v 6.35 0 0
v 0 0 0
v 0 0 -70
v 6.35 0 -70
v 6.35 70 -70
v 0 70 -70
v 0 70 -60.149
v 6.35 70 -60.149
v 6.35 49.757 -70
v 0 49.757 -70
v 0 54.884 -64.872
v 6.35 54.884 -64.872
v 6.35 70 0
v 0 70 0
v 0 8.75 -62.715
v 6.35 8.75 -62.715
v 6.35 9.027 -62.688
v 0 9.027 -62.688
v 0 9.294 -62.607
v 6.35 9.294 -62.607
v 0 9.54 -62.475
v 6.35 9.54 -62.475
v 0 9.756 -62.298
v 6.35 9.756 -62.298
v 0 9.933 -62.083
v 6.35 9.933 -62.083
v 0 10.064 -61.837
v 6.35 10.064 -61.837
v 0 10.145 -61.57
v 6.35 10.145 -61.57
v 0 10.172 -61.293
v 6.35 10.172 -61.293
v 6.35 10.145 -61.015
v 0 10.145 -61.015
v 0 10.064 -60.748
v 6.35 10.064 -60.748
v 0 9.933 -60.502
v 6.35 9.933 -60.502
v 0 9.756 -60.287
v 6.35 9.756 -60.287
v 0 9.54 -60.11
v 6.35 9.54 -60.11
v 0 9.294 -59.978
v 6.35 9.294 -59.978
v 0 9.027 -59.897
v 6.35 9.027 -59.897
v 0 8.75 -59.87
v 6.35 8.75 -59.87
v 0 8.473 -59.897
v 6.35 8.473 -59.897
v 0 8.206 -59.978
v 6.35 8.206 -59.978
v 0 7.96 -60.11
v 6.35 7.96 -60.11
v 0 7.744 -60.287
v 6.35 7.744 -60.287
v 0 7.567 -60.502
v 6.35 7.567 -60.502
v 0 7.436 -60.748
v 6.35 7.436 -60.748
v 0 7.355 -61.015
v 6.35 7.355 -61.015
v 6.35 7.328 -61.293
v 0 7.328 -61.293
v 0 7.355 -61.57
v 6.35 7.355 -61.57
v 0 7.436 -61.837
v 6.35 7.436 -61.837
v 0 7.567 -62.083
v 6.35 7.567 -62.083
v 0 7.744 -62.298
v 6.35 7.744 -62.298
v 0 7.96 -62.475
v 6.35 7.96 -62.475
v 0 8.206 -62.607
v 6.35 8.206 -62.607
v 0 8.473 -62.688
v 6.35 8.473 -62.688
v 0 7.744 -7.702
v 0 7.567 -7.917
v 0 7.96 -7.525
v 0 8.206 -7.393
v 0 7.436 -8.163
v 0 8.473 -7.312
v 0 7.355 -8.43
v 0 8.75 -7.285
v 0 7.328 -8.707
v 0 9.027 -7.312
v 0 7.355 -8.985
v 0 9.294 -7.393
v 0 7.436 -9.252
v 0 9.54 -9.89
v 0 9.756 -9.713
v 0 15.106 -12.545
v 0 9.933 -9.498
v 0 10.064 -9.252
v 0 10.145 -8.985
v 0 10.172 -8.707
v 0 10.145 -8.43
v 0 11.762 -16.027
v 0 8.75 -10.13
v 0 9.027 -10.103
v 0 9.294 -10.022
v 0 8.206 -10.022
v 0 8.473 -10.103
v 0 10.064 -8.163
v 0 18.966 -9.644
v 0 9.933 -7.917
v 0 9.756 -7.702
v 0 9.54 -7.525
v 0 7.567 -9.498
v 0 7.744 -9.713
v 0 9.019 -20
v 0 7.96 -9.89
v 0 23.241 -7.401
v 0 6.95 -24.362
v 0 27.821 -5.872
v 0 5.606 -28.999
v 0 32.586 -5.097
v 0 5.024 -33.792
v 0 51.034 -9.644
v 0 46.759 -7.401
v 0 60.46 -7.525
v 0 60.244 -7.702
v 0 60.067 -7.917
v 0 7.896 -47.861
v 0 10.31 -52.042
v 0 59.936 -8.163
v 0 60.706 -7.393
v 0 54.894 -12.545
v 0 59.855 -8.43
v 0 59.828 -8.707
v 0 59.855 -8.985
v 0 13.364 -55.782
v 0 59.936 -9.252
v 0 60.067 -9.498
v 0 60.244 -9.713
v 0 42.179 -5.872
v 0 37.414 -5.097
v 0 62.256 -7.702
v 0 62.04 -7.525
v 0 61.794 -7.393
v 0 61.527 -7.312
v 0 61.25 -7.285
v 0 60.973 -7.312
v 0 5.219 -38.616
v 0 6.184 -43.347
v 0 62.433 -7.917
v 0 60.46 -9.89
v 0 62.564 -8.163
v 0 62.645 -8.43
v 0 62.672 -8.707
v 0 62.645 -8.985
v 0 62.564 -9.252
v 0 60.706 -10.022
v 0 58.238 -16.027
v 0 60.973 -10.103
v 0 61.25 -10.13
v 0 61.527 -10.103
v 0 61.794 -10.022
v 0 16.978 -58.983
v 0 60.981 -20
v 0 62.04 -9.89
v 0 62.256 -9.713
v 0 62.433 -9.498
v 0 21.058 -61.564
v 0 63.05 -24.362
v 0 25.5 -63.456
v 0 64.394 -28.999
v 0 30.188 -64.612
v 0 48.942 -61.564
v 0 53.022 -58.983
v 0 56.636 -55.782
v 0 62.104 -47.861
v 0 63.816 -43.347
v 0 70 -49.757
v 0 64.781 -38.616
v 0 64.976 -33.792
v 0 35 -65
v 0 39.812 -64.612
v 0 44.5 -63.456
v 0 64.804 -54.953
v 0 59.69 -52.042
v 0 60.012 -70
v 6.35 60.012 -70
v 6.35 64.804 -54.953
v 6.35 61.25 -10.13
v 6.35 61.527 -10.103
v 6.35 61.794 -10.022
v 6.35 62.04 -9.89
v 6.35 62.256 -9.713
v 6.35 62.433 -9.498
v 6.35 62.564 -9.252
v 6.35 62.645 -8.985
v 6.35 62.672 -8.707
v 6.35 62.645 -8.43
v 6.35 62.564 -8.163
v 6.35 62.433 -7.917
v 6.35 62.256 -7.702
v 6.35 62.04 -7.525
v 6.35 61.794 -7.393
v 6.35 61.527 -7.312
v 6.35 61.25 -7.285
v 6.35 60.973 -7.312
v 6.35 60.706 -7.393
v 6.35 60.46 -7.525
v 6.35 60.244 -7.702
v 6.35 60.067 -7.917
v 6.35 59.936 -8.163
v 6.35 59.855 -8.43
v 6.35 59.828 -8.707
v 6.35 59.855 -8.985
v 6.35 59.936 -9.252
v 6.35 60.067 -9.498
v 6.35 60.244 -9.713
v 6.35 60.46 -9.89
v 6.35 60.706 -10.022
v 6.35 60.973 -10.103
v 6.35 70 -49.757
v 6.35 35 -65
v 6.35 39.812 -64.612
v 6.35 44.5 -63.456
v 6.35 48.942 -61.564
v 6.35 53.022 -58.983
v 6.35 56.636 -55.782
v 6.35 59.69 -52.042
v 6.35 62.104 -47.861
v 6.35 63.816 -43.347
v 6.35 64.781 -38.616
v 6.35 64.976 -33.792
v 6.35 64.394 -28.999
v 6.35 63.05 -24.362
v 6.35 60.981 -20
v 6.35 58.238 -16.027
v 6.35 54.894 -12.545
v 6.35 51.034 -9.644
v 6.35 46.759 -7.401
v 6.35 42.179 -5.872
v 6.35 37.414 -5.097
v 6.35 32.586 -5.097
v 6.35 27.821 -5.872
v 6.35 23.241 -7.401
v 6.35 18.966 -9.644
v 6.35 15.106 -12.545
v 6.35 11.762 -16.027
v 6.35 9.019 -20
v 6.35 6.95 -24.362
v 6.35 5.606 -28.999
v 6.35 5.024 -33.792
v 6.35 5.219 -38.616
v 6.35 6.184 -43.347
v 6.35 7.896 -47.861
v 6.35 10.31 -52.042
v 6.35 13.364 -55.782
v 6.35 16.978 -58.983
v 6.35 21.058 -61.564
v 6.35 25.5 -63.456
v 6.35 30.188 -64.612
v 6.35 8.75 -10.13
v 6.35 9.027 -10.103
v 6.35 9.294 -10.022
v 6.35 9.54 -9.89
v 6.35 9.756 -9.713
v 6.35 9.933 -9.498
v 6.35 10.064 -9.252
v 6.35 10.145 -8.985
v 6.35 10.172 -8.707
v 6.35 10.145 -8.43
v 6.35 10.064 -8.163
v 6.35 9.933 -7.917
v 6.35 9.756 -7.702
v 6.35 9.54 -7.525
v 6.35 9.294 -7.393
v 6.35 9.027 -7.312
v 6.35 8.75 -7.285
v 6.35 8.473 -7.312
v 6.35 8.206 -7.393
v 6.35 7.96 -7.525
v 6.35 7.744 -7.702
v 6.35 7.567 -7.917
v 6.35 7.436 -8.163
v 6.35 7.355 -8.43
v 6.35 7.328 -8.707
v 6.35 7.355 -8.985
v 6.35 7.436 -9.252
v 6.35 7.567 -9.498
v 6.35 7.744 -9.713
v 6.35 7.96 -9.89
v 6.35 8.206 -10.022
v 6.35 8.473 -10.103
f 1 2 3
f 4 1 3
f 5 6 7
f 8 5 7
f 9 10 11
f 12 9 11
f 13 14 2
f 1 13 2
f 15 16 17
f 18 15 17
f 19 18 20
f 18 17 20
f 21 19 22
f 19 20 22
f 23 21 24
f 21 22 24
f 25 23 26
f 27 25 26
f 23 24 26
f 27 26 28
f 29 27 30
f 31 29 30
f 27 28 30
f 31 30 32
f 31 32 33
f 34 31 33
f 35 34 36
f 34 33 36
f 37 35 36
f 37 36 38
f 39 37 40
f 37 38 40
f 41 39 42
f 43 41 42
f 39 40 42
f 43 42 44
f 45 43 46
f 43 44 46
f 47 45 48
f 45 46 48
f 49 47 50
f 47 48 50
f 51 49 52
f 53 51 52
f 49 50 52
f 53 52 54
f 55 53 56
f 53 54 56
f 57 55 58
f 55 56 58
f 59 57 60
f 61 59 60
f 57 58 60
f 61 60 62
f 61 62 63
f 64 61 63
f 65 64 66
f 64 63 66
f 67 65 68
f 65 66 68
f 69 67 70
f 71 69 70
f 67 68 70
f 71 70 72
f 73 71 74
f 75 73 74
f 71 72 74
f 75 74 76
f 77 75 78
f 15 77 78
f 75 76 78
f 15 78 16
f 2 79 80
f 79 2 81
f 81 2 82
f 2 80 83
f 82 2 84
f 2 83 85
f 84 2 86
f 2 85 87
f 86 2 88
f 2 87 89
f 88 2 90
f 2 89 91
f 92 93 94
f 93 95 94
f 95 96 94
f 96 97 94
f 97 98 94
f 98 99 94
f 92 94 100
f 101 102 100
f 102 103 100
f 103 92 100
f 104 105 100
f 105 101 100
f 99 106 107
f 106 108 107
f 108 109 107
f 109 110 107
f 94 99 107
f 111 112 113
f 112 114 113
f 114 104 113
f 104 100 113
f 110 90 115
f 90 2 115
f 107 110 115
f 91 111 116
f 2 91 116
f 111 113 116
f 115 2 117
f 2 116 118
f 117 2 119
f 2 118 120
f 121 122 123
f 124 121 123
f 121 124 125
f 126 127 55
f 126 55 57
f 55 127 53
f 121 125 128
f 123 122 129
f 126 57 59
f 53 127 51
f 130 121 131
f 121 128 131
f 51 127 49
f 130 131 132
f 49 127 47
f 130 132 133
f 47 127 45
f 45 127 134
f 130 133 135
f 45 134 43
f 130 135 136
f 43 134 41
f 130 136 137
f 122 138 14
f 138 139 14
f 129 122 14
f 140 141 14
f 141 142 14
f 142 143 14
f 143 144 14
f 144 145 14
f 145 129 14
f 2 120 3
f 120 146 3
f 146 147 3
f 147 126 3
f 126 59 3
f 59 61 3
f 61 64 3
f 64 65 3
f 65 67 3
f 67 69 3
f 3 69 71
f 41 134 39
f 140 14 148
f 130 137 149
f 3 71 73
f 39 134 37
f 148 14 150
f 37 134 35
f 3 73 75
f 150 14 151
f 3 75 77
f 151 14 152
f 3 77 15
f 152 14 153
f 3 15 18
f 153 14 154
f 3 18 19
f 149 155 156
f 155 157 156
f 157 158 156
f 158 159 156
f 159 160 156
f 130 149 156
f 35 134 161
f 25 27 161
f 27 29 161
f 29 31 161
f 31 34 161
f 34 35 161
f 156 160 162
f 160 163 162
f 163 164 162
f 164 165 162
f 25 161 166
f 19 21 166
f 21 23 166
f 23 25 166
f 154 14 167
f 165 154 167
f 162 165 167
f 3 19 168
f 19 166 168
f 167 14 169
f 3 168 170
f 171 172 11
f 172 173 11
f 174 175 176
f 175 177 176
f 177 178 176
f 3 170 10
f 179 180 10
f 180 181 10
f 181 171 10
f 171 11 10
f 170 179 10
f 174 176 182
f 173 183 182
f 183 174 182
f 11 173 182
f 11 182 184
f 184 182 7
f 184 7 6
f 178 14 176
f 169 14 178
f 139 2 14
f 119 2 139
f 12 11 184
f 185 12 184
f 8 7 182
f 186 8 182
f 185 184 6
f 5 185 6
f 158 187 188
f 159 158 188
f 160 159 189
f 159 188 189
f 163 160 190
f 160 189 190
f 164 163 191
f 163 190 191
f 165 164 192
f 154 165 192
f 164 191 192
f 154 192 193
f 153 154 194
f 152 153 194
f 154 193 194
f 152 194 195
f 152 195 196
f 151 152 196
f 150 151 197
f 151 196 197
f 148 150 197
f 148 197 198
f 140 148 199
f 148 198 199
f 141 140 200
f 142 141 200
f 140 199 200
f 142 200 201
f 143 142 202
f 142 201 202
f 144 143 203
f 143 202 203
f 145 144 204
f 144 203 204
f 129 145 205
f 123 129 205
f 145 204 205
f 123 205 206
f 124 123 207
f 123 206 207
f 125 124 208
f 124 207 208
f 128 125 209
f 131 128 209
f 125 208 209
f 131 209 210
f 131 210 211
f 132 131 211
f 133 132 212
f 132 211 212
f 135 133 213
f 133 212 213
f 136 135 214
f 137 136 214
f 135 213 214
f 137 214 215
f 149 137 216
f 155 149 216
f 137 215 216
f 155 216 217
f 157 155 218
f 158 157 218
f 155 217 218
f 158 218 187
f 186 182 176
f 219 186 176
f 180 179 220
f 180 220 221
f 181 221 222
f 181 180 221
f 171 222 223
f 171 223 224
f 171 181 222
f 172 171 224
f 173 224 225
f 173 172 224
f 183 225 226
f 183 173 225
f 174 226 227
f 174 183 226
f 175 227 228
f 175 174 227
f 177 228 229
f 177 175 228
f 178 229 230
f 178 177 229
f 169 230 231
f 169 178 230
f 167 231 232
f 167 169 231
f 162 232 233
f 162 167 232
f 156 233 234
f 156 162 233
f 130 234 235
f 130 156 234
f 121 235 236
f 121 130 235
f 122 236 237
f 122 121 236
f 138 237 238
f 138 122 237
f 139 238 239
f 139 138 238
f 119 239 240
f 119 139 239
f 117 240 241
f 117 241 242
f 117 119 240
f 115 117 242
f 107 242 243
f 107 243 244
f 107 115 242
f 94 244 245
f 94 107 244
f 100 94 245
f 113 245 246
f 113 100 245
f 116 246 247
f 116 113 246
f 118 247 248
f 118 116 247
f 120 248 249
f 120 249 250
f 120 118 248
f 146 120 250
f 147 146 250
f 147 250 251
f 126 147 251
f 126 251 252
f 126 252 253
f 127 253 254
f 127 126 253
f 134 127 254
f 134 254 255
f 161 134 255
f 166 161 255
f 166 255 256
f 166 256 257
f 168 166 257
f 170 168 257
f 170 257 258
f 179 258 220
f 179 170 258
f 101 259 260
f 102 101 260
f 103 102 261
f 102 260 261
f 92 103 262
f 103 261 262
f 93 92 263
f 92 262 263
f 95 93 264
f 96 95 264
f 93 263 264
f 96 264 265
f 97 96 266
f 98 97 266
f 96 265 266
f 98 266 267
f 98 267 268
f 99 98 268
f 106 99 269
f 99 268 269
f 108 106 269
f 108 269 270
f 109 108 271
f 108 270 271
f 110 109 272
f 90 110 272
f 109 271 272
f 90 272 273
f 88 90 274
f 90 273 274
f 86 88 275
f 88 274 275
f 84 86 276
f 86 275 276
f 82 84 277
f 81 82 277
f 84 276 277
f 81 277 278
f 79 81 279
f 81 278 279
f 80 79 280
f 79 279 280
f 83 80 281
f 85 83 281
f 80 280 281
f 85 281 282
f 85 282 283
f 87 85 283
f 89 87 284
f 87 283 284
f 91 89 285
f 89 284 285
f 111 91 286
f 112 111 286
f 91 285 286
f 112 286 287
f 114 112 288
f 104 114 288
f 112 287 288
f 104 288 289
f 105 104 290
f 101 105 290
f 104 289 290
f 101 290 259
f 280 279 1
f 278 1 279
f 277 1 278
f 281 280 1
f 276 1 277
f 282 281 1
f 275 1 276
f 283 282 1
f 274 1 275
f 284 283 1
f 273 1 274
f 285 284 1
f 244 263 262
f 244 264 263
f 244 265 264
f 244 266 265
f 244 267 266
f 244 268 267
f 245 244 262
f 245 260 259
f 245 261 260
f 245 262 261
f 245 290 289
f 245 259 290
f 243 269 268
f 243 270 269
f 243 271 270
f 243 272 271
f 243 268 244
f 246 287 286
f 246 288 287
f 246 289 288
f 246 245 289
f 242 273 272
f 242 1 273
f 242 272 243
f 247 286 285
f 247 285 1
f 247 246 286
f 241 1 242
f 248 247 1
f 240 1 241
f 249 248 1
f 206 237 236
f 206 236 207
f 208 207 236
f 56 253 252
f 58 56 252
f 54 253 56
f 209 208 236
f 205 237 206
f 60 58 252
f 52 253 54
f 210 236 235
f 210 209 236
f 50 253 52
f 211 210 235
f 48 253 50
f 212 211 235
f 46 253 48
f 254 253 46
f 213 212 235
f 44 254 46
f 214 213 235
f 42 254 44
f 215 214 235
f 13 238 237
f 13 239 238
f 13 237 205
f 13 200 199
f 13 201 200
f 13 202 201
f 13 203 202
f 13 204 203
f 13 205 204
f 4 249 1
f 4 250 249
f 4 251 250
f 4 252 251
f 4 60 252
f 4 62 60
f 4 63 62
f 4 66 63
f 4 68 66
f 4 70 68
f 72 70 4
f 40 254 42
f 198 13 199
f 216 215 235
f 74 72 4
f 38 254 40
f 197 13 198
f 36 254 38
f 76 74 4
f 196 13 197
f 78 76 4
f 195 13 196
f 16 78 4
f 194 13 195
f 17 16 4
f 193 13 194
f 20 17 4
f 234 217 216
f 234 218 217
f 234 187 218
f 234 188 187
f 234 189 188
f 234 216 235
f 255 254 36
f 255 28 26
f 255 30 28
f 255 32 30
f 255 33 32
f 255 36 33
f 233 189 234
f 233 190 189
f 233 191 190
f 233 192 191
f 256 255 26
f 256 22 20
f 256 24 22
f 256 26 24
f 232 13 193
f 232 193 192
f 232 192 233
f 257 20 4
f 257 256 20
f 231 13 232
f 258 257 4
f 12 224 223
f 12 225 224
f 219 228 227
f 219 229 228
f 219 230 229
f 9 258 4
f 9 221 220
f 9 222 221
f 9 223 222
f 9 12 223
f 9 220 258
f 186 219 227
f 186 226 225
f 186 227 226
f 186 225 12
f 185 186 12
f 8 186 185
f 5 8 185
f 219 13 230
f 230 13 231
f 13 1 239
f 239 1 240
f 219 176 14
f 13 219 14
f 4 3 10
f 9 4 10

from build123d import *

# Parameters (mm, degrees)
SKETCH1_R           = 30
BOSS_EXTRUDE1_DEPTH = 6.35
SKETCH2_R           = 1.4224
CUT_EXTRUDE1_DEPTH  = 6.35


with BuildPart() as part:
    # Sketch1 → Boss-Extrude1 (new body)
    with BuildSketch(Plane(origin=(0, 0, 0), x_dir=(0, 0, -1), z_dir=(1, 0, 0))):
        Polygon((0, 0), (70, 0), (70, 49.756615014), (64.872483647, 54.884131367), (70, 60.011647719), (70, 70), (60.148635267, 70), (54.952625141, 64.803989874), (49.756615014, 70), (0, 70), align=None)
        with Locations((35, 35)):
            Circle(SKETCH1_R, mode=Mode.SUBTRACT)
    extrude(amount=BOSS_EXTRUDE1_DEPTH)

    # Sketch2 → Cut-Extrude1 (cut)
    with BuildSketch(Plane(origin=(6.35, 0, 0), x_dir=(0, 0, -1), z_dir=(1, 0, 0))):
        with Locations((8.707441752, 61.25)):
            Circle(SKETCH2_R)
        with Locations((8.707441752, 8.75)):
            Circle(SKETCH2_R)
        with Locations((61.292558248, 8.75)):
            Circle(SKETCH2_R)
    extrude(amount=-CUT_EXTRUDE1_DEPTH, mode=Mode.SUBTRACT)


solid = part.part
